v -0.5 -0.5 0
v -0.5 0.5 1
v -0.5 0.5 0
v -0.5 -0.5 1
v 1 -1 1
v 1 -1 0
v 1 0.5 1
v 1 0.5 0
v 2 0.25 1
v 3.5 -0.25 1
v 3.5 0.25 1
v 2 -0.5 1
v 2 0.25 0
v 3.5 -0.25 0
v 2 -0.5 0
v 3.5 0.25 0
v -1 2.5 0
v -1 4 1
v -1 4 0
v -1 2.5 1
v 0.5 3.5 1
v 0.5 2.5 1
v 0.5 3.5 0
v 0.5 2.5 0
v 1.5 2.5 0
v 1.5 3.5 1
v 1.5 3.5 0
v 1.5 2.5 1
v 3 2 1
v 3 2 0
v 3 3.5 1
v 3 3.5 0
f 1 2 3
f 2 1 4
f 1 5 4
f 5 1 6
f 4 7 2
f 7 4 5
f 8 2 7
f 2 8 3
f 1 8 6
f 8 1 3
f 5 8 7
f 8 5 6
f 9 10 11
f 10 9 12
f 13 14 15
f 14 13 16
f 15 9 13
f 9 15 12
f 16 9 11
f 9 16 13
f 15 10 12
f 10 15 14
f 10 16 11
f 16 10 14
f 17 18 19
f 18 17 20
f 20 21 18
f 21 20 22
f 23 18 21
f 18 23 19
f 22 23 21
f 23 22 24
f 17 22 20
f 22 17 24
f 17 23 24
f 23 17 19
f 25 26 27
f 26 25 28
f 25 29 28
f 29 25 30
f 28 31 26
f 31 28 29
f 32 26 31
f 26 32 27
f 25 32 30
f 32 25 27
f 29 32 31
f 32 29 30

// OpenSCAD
// Volume: 6.5625, SurfaceArea: 34.13910712282713
module obj2D() polygon([[-0.5,-0.5], [1,-0.5], [1,1], [-0.5, 0.5]])
square([2,3], center=true);

linear_extrude(1) scale([1, -1]) obj2D();
translate([3,0,0]) linear_extrude(1) scale([-1, -0.5]) obj2D();
translate([0,3,0]) linear_extrude(1) mirror() obj2D();
translate([2,3,0]) linear_extrude(1) mirror([0,1]) obj2D();
